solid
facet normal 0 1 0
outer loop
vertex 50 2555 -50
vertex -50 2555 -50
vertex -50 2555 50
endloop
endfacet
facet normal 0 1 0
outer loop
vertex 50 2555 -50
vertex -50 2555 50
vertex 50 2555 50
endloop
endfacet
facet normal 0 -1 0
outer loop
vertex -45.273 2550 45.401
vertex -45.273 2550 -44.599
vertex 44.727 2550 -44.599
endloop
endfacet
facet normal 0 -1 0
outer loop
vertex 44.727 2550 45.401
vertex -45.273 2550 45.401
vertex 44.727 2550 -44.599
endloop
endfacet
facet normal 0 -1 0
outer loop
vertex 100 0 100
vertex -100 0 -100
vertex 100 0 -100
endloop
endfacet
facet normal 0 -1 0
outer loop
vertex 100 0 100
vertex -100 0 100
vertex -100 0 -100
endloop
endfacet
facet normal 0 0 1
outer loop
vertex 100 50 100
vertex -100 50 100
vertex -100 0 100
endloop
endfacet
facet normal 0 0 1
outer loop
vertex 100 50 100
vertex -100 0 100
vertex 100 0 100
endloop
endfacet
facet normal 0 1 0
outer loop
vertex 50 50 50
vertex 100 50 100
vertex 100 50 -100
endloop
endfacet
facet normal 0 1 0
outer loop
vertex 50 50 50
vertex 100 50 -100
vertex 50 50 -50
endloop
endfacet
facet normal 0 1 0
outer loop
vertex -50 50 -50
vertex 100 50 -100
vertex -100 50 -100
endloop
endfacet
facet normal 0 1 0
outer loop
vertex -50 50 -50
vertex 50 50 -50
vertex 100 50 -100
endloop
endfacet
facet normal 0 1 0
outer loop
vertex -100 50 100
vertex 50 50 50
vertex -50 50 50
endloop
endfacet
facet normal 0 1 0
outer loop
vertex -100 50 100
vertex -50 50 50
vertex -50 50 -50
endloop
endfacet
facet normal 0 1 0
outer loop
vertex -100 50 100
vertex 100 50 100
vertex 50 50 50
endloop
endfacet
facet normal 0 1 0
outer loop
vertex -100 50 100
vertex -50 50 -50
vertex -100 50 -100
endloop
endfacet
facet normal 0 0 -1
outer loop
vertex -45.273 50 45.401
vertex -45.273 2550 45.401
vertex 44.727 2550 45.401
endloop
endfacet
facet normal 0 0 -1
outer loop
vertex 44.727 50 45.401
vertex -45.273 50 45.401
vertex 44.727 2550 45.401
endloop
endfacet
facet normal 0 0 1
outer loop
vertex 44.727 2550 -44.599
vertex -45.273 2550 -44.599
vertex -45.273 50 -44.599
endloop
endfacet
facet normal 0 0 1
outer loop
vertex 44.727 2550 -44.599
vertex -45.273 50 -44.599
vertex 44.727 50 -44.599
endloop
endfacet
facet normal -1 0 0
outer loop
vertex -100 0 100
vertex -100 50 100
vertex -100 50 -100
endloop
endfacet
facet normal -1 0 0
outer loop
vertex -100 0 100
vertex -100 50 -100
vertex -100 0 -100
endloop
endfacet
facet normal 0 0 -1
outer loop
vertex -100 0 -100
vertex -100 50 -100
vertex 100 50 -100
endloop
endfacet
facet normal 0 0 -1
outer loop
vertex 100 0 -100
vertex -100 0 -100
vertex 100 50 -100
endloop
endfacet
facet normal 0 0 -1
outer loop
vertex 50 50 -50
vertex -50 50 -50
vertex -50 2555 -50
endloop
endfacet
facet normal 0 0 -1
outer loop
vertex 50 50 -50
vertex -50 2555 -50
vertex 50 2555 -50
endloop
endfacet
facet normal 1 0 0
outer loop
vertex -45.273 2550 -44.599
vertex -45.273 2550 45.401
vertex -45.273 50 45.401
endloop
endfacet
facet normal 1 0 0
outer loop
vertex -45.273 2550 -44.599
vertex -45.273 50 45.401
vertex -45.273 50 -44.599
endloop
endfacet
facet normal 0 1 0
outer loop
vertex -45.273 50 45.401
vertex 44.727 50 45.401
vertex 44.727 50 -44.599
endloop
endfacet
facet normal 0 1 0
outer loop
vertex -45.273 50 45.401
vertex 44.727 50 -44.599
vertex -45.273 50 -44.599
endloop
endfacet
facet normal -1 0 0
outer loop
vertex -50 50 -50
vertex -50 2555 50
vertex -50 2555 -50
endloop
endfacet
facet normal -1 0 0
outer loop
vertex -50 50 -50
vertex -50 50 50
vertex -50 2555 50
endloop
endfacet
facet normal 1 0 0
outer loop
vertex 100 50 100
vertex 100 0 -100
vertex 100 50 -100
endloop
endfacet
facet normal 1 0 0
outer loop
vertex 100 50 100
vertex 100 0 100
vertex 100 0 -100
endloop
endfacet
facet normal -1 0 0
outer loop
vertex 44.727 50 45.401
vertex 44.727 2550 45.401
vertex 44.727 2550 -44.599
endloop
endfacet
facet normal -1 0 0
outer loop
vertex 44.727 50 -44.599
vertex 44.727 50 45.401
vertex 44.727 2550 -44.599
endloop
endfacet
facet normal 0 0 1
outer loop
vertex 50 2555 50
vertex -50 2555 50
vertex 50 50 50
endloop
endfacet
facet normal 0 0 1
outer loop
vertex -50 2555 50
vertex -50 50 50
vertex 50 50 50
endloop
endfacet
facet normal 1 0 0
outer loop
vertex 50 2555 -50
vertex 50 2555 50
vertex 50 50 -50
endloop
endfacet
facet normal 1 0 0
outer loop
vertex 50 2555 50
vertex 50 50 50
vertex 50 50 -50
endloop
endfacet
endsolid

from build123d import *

# Parameters (mm, degrees)
ESTRUSIONE_ESTRUSIONE1_DEPTH = 100
SCHIZZO2_W                   = 100
SCHIZZO2_H                   = 100
SCHIZZO2_W_2                 = 90
SCHIZZO2_H_2                 = 90
ESTRUSIONE_ESTRUSIONE2_DEPTH = 2500
SCHIZZO3_W                   = 100
SCHIZZO3_H                   = 100
ESTRUSIONE_ESTRUSIONE3_DEPTH = 5


with BuildPart() as part:
    # Schizzo1 → Estrusione-Estrusione1 (new body, symmetric)
    with BuildSketch(Plane.XY):
        Polygon((0, 0), (100, 0), (100, 50), (-100, 50), (-100, 0), align=None)
    extrude(amount=ESTRUSIONE_ESTRUSIONE1_DEPTH, both=True)

    # Schizzo2 → Estrusione-Estrusione2 (add)
    with BuildSketch(Plane(origin=(0, 50, 0), x_dir=(1, 0, 0), z_dir=(0, 1, 0))):
        Rectangle(SCHIZZO2_W, SCHIZZO2_H)
        with Locations((-0.272675023, -0.401025499)):
            Rectangle(SCHIZZO2_W_2, SCHIZZO2_H_2, mode=Mode.SUBTRACT)
    extrude(amount=ESTRUSIONE_ESTRUSIONE2_DEPTH)

    # Schizzo3 → Estrusione-Estrusione3 (add)
    with BuildSketch(Plane(origin=(0, 2550, 0), x_dir=(1, 0, 0), z_dir=(0, 1, 0))):
        Rectangle(SCHIZZO3_W, SCHIZZO3_H)
    extrude(amount=ESTRUSIONE_ESTRUSIONE3_DEPTH)


solid = part.part
